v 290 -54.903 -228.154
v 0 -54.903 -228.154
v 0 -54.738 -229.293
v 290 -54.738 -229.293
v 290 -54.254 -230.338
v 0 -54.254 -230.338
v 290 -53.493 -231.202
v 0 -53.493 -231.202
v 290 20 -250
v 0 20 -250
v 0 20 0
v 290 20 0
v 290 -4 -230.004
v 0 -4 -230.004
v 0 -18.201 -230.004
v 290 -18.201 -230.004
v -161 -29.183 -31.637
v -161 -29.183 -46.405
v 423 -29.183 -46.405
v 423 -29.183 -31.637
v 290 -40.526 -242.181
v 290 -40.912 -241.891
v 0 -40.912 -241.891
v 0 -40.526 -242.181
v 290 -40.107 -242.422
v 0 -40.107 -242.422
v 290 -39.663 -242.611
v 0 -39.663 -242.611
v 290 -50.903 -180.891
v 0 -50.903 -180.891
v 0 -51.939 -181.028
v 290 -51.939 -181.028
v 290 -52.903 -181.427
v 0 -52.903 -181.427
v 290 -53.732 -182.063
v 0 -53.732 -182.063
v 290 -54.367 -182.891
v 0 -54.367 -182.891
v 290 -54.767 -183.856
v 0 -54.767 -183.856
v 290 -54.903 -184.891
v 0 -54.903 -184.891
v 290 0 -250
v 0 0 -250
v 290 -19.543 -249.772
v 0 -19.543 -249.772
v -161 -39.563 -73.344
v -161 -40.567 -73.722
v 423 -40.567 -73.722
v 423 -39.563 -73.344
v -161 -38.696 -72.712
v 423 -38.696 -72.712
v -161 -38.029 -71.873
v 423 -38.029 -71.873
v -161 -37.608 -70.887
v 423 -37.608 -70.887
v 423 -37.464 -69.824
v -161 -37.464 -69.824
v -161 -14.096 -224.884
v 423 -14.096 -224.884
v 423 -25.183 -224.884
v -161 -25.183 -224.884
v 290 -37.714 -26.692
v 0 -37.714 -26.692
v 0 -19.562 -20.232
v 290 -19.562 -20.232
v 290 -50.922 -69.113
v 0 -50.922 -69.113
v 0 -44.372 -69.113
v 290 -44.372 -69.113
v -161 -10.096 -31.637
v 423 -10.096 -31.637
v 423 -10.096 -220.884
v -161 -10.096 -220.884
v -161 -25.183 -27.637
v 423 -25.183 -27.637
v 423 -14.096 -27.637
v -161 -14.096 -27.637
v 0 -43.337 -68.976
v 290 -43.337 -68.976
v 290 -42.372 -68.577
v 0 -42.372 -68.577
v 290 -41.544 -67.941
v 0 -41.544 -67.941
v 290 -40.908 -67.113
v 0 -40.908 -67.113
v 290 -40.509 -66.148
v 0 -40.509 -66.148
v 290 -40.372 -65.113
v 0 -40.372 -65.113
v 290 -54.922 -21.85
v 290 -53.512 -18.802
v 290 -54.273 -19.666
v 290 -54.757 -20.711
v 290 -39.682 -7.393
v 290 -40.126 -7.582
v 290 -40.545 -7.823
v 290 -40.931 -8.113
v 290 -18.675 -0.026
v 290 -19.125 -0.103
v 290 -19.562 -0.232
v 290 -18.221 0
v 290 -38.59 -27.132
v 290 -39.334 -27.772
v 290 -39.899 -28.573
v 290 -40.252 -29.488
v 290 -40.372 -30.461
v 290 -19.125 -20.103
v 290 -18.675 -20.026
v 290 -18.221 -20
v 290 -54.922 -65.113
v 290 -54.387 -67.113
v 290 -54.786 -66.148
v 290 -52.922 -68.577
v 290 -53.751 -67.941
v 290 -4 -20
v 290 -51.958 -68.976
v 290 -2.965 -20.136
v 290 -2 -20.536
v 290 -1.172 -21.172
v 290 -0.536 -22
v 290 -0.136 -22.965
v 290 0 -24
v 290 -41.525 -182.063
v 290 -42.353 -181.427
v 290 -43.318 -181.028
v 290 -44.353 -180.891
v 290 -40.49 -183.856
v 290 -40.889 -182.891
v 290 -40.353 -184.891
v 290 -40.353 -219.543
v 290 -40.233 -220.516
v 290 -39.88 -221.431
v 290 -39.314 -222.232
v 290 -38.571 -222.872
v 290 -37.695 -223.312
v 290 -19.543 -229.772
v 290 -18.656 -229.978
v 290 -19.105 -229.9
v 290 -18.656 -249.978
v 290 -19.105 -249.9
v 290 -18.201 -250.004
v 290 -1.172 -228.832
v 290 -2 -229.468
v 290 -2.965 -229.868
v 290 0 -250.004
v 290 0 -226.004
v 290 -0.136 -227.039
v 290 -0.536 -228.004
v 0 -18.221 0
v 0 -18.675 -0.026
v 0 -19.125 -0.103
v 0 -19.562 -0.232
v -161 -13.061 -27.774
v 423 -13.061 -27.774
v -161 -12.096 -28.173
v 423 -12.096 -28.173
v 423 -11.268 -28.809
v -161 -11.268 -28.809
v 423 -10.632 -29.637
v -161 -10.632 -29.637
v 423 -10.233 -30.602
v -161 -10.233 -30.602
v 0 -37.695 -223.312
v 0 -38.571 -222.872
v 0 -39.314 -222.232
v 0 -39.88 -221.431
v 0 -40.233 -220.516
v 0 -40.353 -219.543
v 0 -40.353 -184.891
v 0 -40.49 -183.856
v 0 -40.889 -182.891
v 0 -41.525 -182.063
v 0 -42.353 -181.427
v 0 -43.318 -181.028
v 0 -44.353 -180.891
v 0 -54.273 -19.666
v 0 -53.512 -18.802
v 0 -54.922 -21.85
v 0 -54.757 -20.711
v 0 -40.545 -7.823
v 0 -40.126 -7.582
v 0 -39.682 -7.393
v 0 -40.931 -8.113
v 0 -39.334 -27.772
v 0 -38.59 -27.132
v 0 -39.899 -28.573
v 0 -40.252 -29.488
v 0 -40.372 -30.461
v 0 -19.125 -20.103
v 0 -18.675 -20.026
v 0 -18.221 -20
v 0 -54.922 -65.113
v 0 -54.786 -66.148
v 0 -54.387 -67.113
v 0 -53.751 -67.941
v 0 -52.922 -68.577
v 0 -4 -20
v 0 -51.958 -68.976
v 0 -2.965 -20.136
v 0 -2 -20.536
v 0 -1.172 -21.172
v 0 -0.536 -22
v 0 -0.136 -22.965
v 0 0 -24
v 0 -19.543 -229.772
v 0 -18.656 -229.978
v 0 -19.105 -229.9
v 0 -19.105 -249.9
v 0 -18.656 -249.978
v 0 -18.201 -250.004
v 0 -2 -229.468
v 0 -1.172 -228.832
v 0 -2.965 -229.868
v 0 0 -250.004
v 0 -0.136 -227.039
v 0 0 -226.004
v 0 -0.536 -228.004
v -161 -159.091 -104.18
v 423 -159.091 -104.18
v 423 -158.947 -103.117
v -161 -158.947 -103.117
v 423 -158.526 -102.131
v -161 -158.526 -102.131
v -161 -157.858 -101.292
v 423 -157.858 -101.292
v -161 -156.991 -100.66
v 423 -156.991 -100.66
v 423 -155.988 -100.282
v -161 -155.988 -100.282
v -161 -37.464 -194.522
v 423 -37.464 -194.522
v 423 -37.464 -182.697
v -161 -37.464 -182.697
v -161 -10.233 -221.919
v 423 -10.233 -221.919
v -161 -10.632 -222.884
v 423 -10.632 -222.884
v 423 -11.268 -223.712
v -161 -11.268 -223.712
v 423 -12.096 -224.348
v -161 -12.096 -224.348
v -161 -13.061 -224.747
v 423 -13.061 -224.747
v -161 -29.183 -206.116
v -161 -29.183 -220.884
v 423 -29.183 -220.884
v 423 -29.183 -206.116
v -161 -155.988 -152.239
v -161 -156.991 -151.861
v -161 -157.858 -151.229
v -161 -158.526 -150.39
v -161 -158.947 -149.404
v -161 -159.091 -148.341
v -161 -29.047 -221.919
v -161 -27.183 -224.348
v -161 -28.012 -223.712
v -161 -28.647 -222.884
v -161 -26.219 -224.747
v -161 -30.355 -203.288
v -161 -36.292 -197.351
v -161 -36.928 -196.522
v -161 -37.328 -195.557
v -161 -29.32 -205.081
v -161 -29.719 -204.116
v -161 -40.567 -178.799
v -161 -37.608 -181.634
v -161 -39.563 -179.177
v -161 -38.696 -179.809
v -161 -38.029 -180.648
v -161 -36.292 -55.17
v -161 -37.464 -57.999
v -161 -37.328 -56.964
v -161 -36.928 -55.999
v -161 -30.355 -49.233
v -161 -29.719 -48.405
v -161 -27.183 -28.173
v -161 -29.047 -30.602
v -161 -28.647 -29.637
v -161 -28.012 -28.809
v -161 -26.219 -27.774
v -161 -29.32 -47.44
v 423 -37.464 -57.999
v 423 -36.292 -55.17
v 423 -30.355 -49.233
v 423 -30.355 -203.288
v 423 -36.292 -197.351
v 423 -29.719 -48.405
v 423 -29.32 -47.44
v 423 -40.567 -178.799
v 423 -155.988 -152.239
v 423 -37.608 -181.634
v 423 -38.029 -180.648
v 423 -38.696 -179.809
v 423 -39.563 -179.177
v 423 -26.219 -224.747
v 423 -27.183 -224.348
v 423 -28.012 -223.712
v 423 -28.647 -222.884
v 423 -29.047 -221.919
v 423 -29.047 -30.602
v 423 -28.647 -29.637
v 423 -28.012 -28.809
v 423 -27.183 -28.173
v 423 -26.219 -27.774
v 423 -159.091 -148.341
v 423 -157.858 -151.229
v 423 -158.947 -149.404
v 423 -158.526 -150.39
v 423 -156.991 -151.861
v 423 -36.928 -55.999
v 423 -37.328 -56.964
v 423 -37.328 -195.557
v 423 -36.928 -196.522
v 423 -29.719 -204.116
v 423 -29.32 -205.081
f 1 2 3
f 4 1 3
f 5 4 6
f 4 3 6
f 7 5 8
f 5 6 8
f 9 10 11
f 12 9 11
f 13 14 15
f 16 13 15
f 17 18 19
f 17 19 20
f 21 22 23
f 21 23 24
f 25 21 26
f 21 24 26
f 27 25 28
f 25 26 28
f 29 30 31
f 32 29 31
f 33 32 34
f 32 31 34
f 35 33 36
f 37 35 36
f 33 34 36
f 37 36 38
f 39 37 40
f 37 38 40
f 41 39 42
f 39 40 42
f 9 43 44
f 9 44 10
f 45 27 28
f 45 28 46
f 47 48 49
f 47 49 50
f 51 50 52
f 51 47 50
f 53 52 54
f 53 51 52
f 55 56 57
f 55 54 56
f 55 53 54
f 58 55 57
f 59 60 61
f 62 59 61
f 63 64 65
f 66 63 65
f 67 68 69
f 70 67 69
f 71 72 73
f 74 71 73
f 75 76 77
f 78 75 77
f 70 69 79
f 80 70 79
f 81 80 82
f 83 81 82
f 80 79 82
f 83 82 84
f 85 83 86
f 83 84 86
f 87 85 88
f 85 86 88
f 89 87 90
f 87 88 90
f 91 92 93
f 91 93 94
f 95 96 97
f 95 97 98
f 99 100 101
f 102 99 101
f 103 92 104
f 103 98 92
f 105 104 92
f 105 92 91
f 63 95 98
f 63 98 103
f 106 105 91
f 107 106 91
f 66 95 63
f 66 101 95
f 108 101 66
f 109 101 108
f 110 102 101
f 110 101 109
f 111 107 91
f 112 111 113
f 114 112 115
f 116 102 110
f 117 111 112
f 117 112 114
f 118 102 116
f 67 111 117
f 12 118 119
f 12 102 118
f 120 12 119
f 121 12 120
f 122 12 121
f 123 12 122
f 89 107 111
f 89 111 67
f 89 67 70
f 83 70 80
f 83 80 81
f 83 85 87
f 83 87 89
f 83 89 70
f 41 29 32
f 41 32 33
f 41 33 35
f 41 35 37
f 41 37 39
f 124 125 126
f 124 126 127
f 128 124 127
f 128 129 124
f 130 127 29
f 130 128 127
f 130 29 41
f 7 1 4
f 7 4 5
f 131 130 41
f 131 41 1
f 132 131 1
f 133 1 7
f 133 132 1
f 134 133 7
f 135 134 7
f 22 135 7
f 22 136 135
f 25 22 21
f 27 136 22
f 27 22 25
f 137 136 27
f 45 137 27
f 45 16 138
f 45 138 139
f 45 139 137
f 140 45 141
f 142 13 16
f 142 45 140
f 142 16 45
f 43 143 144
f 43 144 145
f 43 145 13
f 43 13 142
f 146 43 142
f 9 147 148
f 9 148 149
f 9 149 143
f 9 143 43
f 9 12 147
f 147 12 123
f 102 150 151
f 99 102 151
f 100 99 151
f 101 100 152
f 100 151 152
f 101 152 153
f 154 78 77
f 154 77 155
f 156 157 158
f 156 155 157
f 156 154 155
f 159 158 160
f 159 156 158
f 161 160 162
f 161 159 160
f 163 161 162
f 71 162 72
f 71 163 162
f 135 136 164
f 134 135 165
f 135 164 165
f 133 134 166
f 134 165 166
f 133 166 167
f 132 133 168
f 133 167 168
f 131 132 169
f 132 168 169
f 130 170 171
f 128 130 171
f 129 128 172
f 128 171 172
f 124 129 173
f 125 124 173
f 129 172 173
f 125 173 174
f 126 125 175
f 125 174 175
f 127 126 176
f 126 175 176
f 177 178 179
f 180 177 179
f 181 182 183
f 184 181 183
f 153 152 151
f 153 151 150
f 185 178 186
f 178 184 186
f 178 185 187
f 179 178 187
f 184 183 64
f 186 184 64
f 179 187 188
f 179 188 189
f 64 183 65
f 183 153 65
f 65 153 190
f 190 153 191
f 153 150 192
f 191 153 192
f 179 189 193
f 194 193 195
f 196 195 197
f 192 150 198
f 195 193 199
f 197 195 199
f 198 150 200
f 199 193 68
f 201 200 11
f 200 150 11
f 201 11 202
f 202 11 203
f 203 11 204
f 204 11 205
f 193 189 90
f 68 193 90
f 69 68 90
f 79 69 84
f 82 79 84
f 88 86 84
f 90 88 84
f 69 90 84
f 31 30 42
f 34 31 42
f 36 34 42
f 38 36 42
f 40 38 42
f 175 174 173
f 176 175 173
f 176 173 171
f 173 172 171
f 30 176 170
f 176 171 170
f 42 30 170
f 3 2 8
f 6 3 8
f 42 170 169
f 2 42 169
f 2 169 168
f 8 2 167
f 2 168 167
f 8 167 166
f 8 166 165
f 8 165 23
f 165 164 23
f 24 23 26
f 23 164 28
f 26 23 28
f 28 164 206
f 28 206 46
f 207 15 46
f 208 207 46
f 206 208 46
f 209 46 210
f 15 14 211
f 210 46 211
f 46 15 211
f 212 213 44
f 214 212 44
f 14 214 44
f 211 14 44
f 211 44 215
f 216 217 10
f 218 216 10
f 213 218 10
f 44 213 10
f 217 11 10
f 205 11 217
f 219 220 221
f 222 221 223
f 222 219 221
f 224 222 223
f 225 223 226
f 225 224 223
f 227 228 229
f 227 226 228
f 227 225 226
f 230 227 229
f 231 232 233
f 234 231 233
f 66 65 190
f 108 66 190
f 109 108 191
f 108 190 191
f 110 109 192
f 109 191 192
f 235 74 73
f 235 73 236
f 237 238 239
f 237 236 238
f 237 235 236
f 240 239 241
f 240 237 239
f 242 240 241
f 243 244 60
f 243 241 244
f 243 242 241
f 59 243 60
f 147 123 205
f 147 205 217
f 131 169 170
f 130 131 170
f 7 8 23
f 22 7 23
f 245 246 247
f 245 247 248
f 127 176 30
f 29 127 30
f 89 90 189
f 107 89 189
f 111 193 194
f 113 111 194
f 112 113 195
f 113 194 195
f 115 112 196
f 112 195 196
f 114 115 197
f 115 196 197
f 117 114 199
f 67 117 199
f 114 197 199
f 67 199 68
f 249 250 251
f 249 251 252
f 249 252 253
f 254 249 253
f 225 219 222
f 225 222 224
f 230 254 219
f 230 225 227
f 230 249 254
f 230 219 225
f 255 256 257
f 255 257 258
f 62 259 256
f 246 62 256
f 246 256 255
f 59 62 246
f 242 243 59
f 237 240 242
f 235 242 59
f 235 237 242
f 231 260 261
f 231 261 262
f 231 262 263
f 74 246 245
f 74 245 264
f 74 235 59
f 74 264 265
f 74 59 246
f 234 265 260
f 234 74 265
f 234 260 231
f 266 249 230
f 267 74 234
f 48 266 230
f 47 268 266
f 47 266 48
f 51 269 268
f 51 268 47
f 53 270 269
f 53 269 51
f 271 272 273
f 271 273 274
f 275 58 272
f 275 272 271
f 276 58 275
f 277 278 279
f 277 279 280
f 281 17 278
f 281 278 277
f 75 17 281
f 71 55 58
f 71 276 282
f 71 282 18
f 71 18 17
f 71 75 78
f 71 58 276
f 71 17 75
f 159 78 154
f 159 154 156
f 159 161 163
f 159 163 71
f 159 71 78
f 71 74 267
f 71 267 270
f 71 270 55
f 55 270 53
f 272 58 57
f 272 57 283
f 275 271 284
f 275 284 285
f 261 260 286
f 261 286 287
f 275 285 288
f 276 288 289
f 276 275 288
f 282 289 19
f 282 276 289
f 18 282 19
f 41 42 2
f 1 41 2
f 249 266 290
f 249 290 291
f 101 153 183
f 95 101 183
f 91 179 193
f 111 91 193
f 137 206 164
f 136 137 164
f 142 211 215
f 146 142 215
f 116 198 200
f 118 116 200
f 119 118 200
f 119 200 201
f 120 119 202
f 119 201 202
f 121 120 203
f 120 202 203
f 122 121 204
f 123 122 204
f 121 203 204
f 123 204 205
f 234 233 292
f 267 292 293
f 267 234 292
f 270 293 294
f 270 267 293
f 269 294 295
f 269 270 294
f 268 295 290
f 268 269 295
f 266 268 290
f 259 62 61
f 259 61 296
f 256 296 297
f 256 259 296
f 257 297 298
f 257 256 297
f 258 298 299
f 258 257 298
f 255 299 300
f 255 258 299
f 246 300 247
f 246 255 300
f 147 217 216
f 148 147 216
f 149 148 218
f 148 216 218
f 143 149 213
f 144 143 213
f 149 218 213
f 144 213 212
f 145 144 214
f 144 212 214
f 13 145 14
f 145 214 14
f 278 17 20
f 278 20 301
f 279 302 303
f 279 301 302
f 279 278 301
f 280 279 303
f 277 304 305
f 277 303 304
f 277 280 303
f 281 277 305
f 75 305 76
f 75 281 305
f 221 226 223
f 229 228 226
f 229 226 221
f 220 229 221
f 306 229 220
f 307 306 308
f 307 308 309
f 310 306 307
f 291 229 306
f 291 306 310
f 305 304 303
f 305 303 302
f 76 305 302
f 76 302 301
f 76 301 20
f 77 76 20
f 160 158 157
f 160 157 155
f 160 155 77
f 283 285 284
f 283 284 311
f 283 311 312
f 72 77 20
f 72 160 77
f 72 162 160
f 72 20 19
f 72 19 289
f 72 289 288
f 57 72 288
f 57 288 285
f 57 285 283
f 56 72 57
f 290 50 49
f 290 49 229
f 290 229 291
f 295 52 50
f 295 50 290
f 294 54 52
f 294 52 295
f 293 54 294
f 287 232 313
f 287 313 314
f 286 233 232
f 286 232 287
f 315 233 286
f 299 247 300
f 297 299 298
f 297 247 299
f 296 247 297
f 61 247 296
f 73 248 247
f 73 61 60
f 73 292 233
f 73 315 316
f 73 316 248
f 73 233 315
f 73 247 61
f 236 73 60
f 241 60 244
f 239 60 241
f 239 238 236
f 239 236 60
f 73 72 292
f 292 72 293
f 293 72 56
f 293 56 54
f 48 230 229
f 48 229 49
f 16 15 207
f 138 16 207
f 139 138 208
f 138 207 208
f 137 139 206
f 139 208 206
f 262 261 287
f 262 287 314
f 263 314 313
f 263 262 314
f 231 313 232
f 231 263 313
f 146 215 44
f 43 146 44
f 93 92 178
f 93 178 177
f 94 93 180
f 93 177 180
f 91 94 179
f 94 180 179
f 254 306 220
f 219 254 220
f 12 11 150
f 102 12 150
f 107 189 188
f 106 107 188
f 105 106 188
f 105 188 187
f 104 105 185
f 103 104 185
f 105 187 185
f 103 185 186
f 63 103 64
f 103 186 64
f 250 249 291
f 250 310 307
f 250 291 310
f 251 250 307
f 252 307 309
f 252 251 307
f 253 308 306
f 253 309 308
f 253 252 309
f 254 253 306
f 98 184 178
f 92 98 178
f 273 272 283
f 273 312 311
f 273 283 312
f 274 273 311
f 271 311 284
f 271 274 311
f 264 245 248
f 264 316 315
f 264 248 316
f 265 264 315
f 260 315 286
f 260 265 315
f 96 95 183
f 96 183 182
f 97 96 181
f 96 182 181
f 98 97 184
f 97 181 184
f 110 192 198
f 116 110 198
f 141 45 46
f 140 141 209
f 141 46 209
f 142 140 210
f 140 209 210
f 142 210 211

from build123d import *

# Parameters (mm, degrees)
BOSS_EXTRUDE5_DEPTH = 290
BOSS_EXTRUDE6_DEPTH = 133
BOSS_EXTRUDE7_START = 161
BOSS_EXTRUDE7_DEPTH = 161


with BuildPart() as part:
    # Sketch2 → Boss-Extrude5 (new body)
    with BuildSketch(Plane(origin=(0, 0, 0), x_dir=(0, 0, -1), z_dir=(1, 0, 0))):
        with BuildLine():
            Line((47.65128655, -47.647444653), (69.112553011, -47.647444653))
            Line((69.112553011, -47.647444653), (69.112553011, -44.372439073))
            ThreePointArc((69.112553011, -44.372439073), (67.940980136, -41.544011948), (65.112553011, -40.372439073))
            Line((65.112553011, -40.372439073), (47.65128655, -40.372439073))
            Line((47.65128655, -40.372439073), (47.65128655, -47.647444653))
        make_face()
        Polygon((20, -29.183388594), (20, -18.220530088), (20, -10.096437584), (9.907242899, -10.096437584), (9.907242899, -29.183388594), align=None)
        with BuildLine():
            Line((180.891393153, -44.353308741), (180.891393153, -47.628314321))
            Line((180.891393153, -47.628314321), (202.352659615, -47.628314321))
            Line((202.352659615, -47.628314321), (202.352659615, -40.353308741))
            Line((202.352659615, -40.353308741), (184.891393153, -40.353308741))
            ThreePointArc((184.891393153, -40.353308741), (182.062966029, -41.524881617), (180.891393153, -44.353308741))
        make_face()
        Polygon((240.709987292, -11.100699878), (230.003946164, -11.100699878), (230.003946164, -18.201399757), (230.003946164, -29.183388594), (240.709987292, -29.183388594), align=None)
        with BuildLine():
            Line((220.883509716, -10.096437584), (206.116246719, -10.096437584))
            Line((206.116246719, -10.096437584), (206.116246719, -29.183388594))
            Line((206.116246719, -29.183388594), (220.883509716, -29.183388594))
            ThreePointArc((220.883509716, -29.183388594), (223.711936841, -28.011815719), (224.883509716, -25.183388594))
            Line((224.883509716, -25.183388594), (224.883509716, -14.096437584))
            ThreePointArc((224.883509716, -14.096437584), (223.711936841, -11.268010459), (220.883509716, -10.096437584))
        make_face()
        with BuildLine():
            Line((31.637413711, -29.183388594), (46.404676709, -29.183388594))
            Line((46.404676709, -29.183388594), (46.404676709, -10.096437584))
            Line((46.404676709, -10.096437584), (31.637413711, -10.096437584))
            ThreePointArc((31.637413711, -10.096437584), (28.808986587, -11.268010459), (27.637413711, -14.096437584))
            Line((27.637413711, -14.096437584), (27.637413711, -25.183388594))
            ThreePointArc((27.637413711, -25.183388594), (28.808986587, -28.011815719), (31.637413711, -29.183388594))
        make_face()
        with BuildLine():
            ThreePointArc((46.404676709, -29.183388594), (47.935410438, -29.487870464), (49.233103833, -30.35496147))
            Line((49.233103833, -30.35496147), (55.170377581, -36.292235217))
            ThreePointArc((55.170377581, -36.292235217), (56.468070976, -37.159326222), (57.998804705, -37.463808092))
            Line((57.998804705, -37.463808092), (69.823983025, -37.463808092))
            ThreePointArc((69.823983025, -37.463808092), (72.315164546, -38.334269048), (73.722107943, -40.566800779))
            Line((73.722107943, -40.566800779), (100.281918883, -155.987778215))
            ThreePointArc((100.281918883, -155.987778215), (101.688862279, -158.220309946), (104.180043801, -159.090770902))
            Line((104.180043801, -159.090770902), (148.340879626, -159.090770902))
            ThreePointArc((148.340879626, -159.090770902), (150.832061148, -158.220309946), (152.239004545, -155.987778215))
            Line((152.239004545, -155.987778215), (178.798815484, -40.566800779))
            ThreePointArc((178.798815484, -40.566800779), (180.205758881, -38.334269048), (182.696940403, -37.463808092))
            Line((182.696940403, -37.463808092), (194.522118722, -37.463808092))
            ThreePointArc((194.522118722, -37.463808092), (196.052852452, -37.159326222), (197.350545847, -36.292235217))
            Line((197.350545847, -36.292235217), (203.287819594, -30.35496147))
            ThreePointArc((203.287819594, -30.35496147), (204.585512989, -29.487870464), (206.116246719, -29.183388594))
            Line((206.116246719, -29.183388594), (206.116246719, -10.096437584))
            Line((206.116246719, -10.096437584), (46.404676709, -10.096437584))
            Line((46.404676709, -10.096437584), (46.404676709, -29.183388594))
        make_face()
        with BuildLine():
            ThreePointArc((0, -18.220530088), (0.058322558, -18.901102602), (0.231589473, -19.56182875))
            Line((0.231589473, -19.56182875), (7.393090493, -39.682236379))
            ThreePointArc((7.393090493, -39.682236379), (7.696396138, -40.339199), (8.113096085, -40.930769246))
            Line((8.113096085, -40.930769246), (18.801964029, -53.512281762))
            ThreePointArc((18.801964029, -53.512281762), (20.170983082, -54.5528308), (21.850368965, -54.922450233))
            Line((21.850368965, -54.922450233), (47.65128655, -54.922450233))
            Line((47.65128655, -54.922450233), (65.112553011, -54.922450233))
            ThreePointArc((65.112553011, -54.922450233), (67.940980136, -53.750877358), (69.112553011, -50.922450233))
            Line((69.112553011, -50.922450233), (69.112553011, -47.647444653))
            Line((69.112553011, -47.647444653), (47.65128655, -47.647444653))
            Line((47.65128655, -47.647444653), (47.65128655, -40.372439073))
            Line((47.65128655, -40.372439073), (30.460848961, -40.372439073))
            ThreePointArc((30.460848961, -40.372439073), (28.154899552, -39.640863361), (26.692438434, -37.713737735))
            Line((26.692438434, -37.713737735), (20.231589473, -19.56182875))
            ThreePointArc((20.231589473, -19.56182875), (20.058322558, -18.901102602), (20, -18.220530088))
            Line((20, -18.220530088), (20, -29.183388594))
            Line((20, -29.183388594), (9.907242899, -29.183388594))
            Line((9.907242899, -29.183388594), (9.907242899, -10.096437584))
            Line((9.907242899, -10.096437584), (20, -10.096437584))
            Line((20, -10.096437584), (20, -4))
            ThreePointArc((20, -4), (21.171572875, -1.171572875), (24, 0))
            Line((24, 0), (115.13353494, 0))
            Line((115.13353494, 0), (125.001973082, 0))
            Line((125.001973082, 0), (226.003946164, 0))
            ThreePointArc((226.003946164, 0), (228.832373289, -1.171572875), (230.003946164, -4))
            Line((230.003946164, -4), (230.003946164, -11.100699878))
            Line((230.003946164, -11.100699878), (240.709987292, -11.100699878))
            Line((240.709987292, -11.100699878), (240.709987292, -29.183388594))
            Line((240.709987292, -29.183388594), (230.003946164, -29.183388594))
            Line((230.003946164, -29.183388594), (230.003946164, -18.201399757))
            ThreePointArc((230.003946164, -18.201399757), (229.945623606, -18.88197227), (229.772356691, -19.542698419))
            Line((229.772356691, -19.542698419), (223.311507731, -37.694607403))
            ThreePointArc((223.311507731, -37.694607403), (221.849046613, -39.621733029), (219.543097204, -40.353308741))
            Line((219.543097204, -40.353308741), (202.352659615, -40.353308741))
            Line((202.352659615, -40.353308741), (202.352659615, -47.628314321))
            Line((202.352659615, -47.628314321), (180.891393153, -47.628314321))
            Line((180.891393153, -47.628314321), (180.891393153, -50.903319902))
            ThreePointArc((180.891393153, -50.903319902), (182.062966029, -53.731747026), (184.891393153, -54.903319902))
            Line((184.891393153, -54.903319902), (202.352659615, -54.903319902))
            Line((202.352659615, -54.903319902), (228.1535772, -54.903319902))
            ThreePointArc((228.1535772, -54.903319902), (229.832963082, -54.533700468), (231.201982136, -53.493151431))
            Line((231.201982136, -53.493151431), (241.89085008, -40.911638914))
            ThreePointArc((241.89085008, -40.911638914), (242.307550026, -40.320068669), (242.610855671, -39.663106047))
            Line((242.610855671, -39.663106047), (249.772356691, -19.542698419))
            ThreePointArc((249.772356691, -19.542698419), (249.945623606, -18.88197227), (250.003946164, -18.201399757))
            Line((250.003946164, -18.201399757), (250.003946164, 0))
            Line((250.003946164, 0), (250, 0))
            Line((250, 0), (250, 20))
            Line((250, 20), (0, 20))
            Line((0, 20), (0, 0))
            Line((0, 0), (0, -18.220530088))
        make_face()
    extrude(amount=BOSS_EXTRUDE5_DEPTH)

    # Sketch3 → Boss-Extrude6 (add)
    with BuildSketch(Plane(origin=(290, 0, 0), x_dir=(0, 0, -1), z_dir=(1, 0, 0))):
        with BuildLine():
            Line((206.116246719, -29.183388594), (220.883509716, -29.183388594))
            ThreePointArc((220.883509716, -29.183388594), (223.711936841, -28.011815719), (224.883509716, -25.183388594))
            Line((224.883509716, -25.183388594), (224.883509716, -14.096437584))
            ThreePointArc((224.883509716, -14.096437584), (223.711936841, -11.268010459), (220.883509716, -10.096437584))
            Line((220.883509716, -10.096437584), (31.637413711, -10.096437584))
            ThreePointArc((31.637413711, -10.096437584), (28.808986587, -11.268010459), (27.637413711, -14.096437584))
            Line((27.637413711, -14.096437584), (27.637413711, -25.183388594))
            ThreePointArc((27.637413711, -25.183388594), (28.808986587, -28.011815719), (31.637413711, -29.183388594))
            Line((31.637413711, -29.183388594), (46.404676709, -29.183388594))
            ThreePointArc((46.404676709, -29.183388594), (47.935410438, -29.487870464), (49.233103833, -30.35496147))
            Line((49.233103833, -30.35496147), (55.170377581, -36.292235217))
            ThreePointArc((55.170377581, -36.292235217), (56.468070976, -37.159326222), (57.998804705, -37.463808092))
            Line((57.998804705, -37.463808092), (69.823983025, -37.463808092))
            ThreePointArc((69.823983025, -37.463808092), (72.315164546, -38.334269048), (73.722107943, -40.566800779))
            Line((73.722107943, -40.566800779), (100.281918883, -155.987778215))
            ThreePointArc((100.281918883, -155.987778215), (101.688862279, -158.220309946), (104.180043801, -159.090770902))
            Line((104.180043801, -159.090770902), (148.340879626, -159.090770902))
            ThreePointArc((148.340879626, -159.090770902), (150.832061148, -158.220309946), (152.239004545, -155.987778215))
            Line((152.239004545, -155.987778215), (178.798815484, -40.566800779))
            ThreePointArc((178.798815484, -40.566800779), (180.205758881, -38.334269048), (182.696940403, -37.463808092))
            Line((182.696940403, -37.463808092), (194.522118722, -37.463808092))
            ThreePointArc((194.522118722, -37.463808092), (196.052852452, -37.159326222), (197.350545847, -36.292235217))
            Line((197.350545847, -36.292235217), (203.287819594, -30.35496147))
            ThreePointArc((203.287819594, -30.35496147), (204.585512989, -29.487870464), (206.116246719, -29.183388594))
        make_face()
    extrude(amount=BOSS_EXTRUDE6_DEPTH)

    # Sketch4 → Boss-Extrude7 (add)
    with BuildSketch(Plane.ZY.offset(BOSS_EXTRUDE7_START)):
        with BuildLine():
            Line((-220.883509716, -29.183388594), (-206.116246719, -29.183388594))
            ThreePointArc((-206.116246719, -29.183388594), (-204.585512989, -29.487870464), (-203.287819594, -30.35496147))
            Line((-203.287819594, -30.35496147), (-197.350545847, -36.292235217))
            ThreePointArc((-197.350545847, -36.292235217), (-196.052852452, -37.159326222), (-194.522118722, -37.463808092))
            Line((-194.522118722, -37.463808092), (-182.696940403, -37.463808092))
            ThreePointArc((-182.696940403, -37.463808092), (-180.205758881, -38.334269048), (-178.798815484, -40.566800779))
            Line((-178.798815484, -40.566800779), (-152.239004545, -155.987778215))
            ThreePointArc((-152.239004545, -155.987778215), (-150.832061148, -158.220309946), (-148.340879626, -159.090770902))
            Line((-148.340879626, -159.090770902), (-104.180043801, -159.090770902))
            ThreePointArc((-104.180043801, -159.090770902), (-101.688862279, -158.220309946), (-100.281918883, -155.987778215))
            Line((-100.281918883, -155.987778215), (-73.722107943, -40.566800779))
            ThreePointArc((-73.722107943, -40.566800779), (-72.315164546, -38.334269048), (-69.823983025, -37.463808092))
            Line((-69.823983025, -37.463808092), (-57.998804705, -37.463808092))
            ThreePointArc((-57.998804705, -37.463808092), (-56.468070976, -37.159326222), (-55.170377581, -36.292235217))
            Line((-55.170377581, -36.292235217), (-49.233103833, -30.35496147))
            ThreePointArc((-49.233103833, -30.35496147), (-47.935410438, -29.487870464), (-46.404676709, -29.183388594))
            Line((-46.404676709, -29.183388594), (-31.637413711, -29.183388594))
            ThreePointArc((-31.637413711, -29.183388594), (-28.808986587, -28.011815719), (-27.637413711, -25.183388594))
            Line((-27.637413711, -25.183388594), (-27.637413711, -14.096437584))
            ThreePointArc((-27.637413711, -14.096437584), (-28.808986587, -11.268010459), (-31.637413711, -10.096437584))
            Line((-31.637413711, -10.096437584), (-220.883509716, -10.096437584))
            ThreePointArc((-220.883509716, -10.096437584), (-223.711936841, -11.268010459), (-224.883509716, -14.096437584))
            Line((-224.883509716, -14.096437584), (-224.883509716, -25.183388594))
            ThreePointArc((-224.883509716, -25.183388594), (-223.711936841, -28.011815719), (-220.883509716, -29.183388594))
        make_face()
    extrude(amount=-BOSS_EXTRUDE7_DEPTH)


solid = part.part
